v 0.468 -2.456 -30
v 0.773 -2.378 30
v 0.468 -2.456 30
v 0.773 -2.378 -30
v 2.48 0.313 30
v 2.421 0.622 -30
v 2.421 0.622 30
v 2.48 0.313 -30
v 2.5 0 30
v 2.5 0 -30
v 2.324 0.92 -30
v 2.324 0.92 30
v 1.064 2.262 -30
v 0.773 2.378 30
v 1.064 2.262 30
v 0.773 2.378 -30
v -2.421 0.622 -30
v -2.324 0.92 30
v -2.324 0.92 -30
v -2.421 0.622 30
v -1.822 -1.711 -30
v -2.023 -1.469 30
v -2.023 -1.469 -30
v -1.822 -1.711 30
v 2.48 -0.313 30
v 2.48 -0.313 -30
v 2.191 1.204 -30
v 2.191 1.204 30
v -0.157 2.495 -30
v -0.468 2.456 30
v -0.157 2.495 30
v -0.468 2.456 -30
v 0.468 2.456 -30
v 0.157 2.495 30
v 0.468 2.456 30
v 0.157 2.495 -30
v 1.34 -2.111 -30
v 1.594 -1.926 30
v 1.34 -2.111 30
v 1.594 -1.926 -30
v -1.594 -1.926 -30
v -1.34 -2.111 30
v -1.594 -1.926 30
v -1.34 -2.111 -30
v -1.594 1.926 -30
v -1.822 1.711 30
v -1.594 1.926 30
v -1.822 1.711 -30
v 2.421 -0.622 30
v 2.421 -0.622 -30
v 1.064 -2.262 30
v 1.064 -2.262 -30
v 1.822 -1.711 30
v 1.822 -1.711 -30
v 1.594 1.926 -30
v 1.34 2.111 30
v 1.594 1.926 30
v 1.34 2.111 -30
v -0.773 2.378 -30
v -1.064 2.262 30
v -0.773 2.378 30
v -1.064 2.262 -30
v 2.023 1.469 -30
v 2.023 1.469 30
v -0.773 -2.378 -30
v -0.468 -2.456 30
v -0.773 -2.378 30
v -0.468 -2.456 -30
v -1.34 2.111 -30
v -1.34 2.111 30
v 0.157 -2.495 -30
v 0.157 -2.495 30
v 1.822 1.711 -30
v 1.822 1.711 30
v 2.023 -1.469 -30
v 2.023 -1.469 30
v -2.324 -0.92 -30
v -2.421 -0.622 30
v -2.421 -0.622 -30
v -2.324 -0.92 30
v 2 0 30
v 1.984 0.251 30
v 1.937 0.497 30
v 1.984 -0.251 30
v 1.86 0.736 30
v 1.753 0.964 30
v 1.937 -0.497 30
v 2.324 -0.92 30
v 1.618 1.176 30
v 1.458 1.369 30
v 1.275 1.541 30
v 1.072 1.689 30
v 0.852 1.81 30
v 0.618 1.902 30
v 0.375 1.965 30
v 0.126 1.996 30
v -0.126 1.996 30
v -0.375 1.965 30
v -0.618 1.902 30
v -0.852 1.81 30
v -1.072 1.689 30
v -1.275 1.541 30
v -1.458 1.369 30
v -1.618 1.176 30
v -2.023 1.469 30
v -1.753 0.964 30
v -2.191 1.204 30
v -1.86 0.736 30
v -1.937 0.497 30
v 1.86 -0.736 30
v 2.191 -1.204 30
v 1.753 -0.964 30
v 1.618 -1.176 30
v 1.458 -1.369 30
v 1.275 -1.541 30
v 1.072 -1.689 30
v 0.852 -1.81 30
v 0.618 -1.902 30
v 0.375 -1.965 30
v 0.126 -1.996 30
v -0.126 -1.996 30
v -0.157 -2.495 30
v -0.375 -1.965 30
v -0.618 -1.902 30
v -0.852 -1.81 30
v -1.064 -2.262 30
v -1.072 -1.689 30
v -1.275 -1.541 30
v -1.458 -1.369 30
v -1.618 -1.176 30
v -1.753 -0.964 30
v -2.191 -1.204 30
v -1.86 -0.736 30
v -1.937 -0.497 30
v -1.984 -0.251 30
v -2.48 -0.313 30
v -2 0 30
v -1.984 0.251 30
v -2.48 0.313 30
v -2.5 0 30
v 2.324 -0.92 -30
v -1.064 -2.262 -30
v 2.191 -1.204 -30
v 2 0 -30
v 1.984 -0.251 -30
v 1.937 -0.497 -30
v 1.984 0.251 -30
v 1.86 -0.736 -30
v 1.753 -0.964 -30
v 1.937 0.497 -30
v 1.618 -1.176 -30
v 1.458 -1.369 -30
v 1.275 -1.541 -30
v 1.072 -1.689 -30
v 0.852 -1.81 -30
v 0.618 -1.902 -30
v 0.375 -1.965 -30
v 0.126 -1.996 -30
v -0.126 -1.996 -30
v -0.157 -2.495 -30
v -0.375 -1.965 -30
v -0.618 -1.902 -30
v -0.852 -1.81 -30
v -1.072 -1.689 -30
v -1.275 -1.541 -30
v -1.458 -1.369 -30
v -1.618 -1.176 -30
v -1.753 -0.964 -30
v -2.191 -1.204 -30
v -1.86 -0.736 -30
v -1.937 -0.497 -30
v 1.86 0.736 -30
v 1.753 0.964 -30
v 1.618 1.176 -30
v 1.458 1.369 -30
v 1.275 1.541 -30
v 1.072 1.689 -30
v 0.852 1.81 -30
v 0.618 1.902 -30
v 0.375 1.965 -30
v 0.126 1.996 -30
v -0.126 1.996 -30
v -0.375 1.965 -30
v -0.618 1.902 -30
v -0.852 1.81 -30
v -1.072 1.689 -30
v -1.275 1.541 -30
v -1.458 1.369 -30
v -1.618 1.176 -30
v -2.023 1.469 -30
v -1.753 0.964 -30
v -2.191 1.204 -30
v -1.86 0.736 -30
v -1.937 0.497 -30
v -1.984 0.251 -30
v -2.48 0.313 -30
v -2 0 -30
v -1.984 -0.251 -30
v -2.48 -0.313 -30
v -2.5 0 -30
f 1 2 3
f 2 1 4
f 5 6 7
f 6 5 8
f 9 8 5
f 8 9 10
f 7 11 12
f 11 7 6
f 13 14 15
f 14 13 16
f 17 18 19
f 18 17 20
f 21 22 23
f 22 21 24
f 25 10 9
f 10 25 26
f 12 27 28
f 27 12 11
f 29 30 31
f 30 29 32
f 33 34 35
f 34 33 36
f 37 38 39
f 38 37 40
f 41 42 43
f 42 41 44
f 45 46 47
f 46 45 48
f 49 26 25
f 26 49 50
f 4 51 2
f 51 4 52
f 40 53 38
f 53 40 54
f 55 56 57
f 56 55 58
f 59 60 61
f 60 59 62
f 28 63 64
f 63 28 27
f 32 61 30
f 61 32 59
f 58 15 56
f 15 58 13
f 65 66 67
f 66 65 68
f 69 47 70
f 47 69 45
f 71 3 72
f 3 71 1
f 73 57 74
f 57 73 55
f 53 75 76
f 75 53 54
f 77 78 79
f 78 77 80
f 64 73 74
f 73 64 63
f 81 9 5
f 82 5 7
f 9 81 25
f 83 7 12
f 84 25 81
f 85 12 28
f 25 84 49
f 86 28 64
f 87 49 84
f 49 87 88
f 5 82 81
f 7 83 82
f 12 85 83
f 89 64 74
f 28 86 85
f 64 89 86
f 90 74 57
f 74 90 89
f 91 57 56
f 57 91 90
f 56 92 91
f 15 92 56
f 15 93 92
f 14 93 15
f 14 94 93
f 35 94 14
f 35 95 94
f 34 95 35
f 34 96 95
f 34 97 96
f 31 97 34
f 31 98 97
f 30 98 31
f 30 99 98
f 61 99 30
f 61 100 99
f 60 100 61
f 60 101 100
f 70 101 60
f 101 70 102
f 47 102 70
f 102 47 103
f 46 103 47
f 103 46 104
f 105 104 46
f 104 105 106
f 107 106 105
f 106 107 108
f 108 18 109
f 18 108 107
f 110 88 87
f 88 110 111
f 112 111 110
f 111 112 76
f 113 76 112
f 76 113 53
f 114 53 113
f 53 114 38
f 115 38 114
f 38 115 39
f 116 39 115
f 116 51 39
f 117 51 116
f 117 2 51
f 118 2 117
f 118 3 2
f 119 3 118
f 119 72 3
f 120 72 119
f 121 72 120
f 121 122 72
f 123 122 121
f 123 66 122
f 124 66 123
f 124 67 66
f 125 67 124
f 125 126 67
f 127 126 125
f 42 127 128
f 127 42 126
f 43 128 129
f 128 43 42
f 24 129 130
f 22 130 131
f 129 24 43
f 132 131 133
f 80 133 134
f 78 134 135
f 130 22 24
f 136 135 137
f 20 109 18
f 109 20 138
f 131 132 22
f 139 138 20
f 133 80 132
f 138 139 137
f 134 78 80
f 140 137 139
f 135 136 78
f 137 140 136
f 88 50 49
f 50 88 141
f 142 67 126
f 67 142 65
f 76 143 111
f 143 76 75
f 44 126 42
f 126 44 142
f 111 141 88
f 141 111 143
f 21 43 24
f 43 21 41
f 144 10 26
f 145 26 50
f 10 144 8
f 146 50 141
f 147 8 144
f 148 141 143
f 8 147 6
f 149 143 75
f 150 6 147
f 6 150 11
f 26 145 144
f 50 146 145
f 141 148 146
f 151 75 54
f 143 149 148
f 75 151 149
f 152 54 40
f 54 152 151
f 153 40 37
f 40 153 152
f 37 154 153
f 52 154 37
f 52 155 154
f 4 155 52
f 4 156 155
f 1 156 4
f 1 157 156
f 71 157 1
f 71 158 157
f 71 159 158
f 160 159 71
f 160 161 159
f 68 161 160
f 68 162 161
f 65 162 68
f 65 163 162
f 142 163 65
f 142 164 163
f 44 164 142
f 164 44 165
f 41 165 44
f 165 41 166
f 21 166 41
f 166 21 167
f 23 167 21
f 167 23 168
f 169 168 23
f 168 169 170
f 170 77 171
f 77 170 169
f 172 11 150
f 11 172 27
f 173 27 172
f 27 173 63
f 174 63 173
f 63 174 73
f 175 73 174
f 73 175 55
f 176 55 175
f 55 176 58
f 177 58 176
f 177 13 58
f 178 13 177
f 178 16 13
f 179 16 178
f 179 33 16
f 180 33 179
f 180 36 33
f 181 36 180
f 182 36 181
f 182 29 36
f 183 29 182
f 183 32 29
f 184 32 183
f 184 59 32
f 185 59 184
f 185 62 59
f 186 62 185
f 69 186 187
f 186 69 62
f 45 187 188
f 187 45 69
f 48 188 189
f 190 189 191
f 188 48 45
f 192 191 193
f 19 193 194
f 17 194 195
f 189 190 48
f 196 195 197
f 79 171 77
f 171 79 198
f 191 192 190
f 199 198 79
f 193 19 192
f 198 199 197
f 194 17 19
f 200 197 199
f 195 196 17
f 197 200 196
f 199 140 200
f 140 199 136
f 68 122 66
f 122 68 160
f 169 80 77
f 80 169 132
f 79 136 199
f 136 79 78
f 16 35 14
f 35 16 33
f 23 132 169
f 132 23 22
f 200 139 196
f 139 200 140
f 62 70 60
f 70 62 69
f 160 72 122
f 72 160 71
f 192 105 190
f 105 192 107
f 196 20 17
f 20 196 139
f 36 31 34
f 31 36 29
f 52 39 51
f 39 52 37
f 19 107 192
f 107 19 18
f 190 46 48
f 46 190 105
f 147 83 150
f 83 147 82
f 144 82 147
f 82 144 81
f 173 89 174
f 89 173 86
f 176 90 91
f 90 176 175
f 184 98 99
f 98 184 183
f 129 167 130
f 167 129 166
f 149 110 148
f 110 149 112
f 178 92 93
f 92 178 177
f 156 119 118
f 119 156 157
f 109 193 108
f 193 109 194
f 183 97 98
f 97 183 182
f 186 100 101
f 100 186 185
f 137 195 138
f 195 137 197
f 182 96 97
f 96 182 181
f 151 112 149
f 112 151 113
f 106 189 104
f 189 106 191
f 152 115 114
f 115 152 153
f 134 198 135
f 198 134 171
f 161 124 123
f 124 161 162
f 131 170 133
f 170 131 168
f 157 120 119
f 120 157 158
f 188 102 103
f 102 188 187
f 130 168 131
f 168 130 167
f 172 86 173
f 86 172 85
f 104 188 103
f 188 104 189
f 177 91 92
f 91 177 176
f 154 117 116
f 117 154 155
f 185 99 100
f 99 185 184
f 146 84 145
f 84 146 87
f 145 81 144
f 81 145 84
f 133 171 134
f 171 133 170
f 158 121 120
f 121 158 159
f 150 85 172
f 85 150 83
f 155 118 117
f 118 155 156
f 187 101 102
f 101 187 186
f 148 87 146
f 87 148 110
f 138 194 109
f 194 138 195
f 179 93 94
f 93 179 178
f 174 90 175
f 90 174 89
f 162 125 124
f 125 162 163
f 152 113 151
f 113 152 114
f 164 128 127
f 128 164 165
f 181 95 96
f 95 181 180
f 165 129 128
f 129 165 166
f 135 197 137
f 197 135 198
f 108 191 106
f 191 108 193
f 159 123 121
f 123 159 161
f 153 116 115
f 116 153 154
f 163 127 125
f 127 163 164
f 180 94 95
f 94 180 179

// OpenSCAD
$fn = 50;


difference() {
	union() {
		translate(v = [0, 0, -30.0000000000]) {
			cylinder(h = 60, r = 2.5000000000);
		}
	}
	union() {
		translate(v = [0, 0, -100.0000000000]) {
			cylinder(h = 200, r = 2.0000000000);
		}
	}
}
